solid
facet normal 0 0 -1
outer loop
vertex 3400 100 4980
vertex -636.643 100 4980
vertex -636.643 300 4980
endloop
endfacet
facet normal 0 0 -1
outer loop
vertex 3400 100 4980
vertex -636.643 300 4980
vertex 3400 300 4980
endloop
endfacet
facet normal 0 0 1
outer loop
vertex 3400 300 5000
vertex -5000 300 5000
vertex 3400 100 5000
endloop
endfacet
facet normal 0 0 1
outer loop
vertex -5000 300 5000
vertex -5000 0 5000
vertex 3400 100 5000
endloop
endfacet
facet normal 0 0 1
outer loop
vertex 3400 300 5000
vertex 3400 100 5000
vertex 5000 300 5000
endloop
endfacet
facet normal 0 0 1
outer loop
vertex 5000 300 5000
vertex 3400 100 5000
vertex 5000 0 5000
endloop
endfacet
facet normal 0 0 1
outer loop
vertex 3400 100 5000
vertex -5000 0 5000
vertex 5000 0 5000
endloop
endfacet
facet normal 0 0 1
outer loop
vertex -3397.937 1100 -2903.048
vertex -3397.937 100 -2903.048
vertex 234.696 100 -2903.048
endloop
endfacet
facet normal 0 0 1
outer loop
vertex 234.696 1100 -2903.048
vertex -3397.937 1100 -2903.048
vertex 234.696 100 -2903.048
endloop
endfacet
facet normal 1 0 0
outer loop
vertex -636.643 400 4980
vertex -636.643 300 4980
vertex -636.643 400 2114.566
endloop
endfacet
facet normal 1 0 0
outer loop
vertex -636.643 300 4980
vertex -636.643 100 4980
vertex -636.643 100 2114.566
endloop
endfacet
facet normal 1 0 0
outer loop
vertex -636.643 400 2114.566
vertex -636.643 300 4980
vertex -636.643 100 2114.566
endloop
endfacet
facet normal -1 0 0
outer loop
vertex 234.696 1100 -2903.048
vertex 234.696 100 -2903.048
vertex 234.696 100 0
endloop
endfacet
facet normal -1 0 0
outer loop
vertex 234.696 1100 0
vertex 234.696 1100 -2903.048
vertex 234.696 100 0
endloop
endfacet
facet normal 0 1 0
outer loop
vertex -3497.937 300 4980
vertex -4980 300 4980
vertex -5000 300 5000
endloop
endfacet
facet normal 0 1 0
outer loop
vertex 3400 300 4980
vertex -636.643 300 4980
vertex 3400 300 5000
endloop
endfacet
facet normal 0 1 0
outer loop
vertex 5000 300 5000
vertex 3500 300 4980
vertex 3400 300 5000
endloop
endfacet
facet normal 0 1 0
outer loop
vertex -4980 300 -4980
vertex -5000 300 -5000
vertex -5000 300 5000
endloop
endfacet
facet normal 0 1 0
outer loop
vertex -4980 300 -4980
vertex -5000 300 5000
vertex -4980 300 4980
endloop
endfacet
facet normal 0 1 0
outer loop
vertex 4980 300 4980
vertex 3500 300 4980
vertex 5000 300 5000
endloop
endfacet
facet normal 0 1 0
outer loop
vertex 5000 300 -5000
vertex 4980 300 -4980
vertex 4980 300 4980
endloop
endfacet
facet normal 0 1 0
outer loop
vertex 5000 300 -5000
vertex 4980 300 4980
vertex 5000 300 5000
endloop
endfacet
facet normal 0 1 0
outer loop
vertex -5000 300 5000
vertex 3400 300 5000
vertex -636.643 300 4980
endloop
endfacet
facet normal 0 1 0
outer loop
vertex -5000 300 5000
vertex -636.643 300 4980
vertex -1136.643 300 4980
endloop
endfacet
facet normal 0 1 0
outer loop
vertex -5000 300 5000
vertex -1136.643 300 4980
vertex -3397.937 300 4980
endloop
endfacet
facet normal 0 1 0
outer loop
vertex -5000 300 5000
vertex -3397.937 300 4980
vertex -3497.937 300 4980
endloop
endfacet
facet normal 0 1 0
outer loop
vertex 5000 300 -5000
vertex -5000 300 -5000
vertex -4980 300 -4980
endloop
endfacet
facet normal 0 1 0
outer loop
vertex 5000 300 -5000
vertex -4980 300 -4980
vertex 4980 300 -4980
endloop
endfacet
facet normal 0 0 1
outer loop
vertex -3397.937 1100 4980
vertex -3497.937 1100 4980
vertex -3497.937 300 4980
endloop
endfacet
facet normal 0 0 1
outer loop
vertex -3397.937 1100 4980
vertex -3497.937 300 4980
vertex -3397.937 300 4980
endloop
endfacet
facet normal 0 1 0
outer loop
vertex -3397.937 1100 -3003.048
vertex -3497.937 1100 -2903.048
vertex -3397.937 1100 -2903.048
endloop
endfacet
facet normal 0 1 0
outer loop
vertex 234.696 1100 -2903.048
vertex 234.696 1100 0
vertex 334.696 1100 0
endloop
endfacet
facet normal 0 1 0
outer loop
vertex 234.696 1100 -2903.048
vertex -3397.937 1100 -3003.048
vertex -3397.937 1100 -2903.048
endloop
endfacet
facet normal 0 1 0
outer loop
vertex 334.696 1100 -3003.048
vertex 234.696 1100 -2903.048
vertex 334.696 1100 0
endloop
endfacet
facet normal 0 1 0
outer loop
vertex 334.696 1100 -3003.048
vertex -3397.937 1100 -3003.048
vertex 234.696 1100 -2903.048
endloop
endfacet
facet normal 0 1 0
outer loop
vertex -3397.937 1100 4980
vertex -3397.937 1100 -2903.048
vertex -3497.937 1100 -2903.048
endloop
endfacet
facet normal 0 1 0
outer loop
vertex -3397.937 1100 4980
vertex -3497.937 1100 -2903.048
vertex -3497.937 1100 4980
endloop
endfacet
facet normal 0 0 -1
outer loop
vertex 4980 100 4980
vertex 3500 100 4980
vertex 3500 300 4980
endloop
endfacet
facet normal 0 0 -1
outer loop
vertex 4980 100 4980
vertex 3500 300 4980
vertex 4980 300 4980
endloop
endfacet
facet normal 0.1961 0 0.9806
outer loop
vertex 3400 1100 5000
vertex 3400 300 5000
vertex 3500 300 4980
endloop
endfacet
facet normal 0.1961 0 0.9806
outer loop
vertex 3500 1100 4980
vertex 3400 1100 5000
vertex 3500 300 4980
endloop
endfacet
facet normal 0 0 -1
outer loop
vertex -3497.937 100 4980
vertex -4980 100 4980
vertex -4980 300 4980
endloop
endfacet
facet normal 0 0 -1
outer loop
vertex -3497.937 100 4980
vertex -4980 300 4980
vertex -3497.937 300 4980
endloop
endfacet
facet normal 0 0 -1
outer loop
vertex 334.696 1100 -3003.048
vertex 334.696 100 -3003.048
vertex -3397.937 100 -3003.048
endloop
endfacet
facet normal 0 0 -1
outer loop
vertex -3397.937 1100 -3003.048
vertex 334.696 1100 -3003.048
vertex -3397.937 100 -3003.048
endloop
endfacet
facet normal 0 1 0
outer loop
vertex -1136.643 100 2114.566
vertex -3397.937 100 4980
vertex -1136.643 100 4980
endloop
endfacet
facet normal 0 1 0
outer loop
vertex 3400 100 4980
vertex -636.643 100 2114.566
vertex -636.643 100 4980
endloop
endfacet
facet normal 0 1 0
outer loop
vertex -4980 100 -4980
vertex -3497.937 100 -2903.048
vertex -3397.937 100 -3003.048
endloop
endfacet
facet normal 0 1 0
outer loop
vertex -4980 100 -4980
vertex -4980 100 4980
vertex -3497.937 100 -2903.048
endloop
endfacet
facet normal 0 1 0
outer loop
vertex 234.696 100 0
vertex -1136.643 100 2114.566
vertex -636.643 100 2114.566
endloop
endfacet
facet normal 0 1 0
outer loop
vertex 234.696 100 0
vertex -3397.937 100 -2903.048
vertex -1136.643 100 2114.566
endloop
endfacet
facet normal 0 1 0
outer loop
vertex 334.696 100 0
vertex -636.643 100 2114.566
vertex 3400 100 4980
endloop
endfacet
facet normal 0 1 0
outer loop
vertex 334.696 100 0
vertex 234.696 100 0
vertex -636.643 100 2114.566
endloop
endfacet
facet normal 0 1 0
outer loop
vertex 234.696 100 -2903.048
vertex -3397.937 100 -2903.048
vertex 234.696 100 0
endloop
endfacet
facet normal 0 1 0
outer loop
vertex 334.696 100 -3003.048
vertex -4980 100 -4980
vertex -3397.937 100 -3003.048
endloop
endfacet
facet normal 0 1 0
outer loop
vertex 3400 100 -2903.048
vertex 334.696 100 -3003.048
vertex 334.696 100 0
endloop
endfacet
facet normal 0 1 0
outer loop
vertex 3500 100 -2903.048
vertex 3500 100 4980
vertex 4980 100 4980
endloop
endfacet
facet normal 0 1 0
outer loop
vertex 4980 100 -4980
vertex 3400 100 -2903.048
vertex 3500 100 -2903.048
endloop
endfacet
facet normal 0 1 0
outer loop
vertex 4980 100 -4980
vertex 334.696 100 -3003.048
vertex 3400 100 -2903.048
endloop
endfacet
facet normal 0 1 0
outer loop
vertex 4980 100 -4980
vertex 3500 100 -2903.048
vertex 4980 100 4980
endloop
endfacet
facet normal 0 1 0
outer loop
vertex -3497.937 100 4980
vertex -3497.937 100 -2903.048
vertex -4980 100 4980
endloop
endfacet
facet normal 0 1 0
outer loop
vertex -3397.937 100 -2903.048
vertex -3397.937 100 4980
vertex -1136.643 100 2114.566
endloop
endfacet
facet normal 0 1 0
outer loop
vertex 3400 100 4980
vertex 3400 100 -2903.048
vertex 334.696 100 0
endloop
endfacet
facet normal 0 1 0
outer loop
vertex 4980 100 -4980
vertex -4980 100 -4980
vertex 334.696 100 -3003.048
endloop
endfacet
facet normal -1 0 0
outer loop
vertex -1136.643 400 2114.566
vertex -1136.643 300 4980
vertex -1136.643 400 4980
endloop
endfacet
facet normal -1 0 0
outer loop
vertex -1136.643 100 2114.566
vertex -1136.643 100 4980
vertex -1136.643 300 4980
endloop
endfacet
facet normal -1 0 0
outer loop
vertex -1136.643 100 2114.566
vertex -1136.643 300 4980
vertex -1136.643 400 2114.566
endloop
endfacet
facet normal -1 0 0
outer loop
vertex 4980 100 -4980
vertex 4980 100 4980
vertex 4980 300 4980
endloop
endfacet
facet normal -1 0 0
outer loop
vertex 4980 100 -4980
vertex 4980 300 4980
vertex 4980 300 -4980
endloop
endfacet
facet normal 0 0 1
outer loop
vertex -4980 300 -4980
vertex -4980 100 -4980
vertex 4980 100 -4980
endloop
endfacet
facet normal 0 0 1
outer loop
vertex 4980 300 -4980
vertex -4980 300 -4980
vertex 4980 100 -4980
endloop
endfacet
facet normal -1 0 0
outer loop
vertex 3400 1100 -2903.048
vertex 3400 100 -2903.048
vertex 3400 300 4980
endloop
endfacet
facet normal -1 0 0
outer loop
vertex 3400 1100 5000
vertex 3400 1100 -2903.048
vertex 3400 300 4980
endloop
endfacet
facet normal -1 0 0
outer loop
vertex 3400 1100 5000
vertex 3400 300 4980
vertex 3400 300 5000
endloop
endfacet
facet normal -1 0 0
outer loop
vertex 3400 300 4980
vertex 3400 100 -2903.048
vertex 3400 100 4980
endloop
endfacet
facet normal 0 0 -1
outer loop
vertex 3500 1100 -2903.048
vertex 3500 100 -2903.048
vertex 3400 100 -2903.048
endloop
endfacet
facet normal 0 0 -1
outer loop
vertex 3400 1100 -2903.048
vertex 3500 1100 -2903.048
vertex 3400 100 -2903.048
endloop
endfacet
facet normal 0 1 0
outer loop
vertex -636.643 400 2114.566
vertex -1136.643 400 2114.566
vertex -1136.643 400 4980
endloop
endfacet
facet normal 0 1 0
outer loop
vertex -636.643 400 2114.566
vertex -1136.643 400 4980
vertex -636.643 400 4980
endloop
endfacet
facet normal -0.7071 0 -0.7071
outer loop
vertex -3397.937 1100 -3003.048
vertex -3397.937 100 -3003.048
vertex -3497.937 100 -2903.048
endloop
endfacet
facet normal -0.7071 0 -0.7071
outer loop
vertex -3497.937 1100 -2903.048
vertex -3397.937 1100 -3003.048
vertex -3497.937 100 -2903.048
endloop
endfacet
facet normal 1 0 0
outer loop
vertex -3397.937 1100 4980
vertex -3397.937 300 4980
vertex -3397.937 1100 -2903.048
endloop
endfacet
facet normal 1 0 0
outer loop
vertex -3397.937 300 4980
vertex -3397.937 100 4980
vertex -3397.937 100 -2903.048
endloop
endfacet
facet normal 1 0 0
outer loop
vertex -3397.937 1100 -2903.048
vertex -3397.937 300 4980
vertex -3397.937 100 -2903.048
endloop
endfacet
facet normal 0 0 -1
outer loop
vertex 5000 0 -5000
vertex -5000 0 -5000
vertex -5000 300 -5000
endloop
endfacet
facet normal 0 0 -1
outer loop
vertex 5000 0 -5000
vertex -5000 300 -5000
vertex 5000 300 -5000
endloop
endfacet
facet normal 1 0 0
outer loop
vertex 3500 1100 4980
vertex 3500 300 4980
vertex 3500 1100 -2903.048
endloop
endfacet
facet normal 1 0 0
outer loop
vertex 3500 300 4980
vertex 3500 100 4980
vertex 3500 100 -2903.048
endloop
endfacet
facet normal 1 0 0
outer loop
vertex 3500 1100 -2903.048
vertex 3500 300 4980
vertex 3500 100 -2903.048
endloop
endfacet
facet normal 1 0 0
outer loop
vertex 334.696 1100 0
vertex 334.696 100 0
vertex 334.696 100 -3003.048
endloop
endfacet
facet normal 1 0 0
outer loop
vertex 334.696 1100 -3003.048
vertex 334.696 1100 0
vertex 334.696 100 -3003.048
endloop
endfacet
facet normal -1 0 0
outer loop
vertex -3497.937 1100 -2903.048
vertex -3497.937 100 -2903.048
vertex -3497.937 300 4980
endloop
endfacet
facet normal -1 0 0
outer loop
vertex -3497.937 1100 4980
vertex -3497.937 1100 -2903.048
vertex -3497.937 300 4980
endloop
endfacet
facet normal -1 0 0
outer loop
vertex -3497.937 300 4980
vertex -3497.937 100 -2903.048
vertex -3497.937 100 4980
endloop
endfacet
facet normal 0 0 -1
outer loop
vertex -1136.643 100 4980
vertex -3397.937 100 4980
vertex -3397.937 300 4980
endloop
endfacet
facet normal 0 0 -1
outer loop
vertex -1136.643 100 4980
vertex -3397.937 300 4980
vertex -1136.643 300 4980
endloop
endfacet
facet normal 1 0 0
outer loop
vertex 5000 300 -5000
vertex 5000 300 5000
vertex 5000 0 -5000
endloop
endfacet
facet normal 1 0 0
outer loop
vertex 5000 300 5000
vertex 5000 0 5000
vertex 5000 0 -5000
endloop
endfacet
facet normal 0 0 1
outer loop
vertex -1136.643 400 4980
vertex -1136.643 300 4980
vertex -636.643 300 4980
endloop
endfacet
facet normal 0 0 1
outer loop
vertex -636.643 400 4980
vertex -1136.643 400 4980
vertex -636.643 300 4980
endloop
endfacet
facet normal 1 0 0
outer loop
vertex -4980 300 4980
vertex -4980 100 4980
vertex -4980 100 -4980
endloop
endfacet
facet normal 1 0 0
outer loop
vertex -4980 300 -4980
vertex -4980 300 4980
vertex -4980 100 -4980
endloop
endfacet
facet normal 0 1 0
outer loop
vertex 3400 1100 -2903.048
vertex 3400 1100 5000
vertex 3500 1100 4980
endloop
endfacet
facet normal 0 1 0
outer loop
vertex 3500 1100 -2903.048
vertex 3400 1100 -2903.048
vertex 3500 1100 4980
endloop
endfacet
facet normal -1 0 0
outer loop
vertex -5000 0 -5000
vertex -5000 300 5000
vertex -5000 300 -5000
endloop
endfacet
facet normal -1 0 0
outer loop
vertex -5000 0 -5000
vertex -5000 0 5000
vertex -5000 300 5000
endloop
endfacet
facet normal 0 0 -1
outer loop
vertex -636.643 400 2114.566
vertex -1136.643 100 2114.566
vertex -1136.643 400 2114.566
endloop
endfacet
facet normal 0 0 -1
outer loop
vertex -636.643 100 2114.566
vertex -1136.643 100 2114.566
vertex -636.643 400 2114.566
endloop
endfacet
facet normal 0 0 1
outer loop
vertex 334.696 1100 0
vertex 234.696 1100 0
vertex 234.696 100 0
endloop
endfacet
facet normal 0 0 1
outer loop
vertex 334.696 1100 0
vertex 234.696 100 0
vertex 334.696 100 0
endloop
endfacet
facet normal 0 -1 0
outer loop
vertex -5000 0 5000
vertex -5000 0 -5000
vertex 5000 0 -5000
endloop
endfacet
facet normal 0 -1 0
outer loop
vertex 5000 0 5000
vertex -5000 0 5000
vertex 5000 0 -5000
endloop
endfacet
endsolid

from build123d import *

# Parameters (mm, degrees)
SKETCH1_W           = 10000
SKETCH1_H           = 10000
BOSS_EXTRUDE1_DEPTH = 100
SKETCH2_W           = 10000
SKETCH2_H           = 10000
SKETCH2_W_2         = 9960
SKETCH2_H_2         = 9960
BOSS_EXTRUDE2_DEPTH = 200
BOSS_EXTRUDE3_DEPTH = 1000
SKETCH6_W           = 500
SKETCH6_H           = 2865.434079215
BOSS_EXTRUDE4_DEPTH = 300


with BuildPart() as part:
    # Sketch1 → Boss-Extrude1 (new body)
    with BuildSketch(Plane(origin=(0, 0, 0), x_dir=(1, 0, 0), z_dir=(0, 1, 0))):
        Rectangle(SKETCH1_W, SKETCH1_H)
    extrude(amount=BOSS_EXTRUDE1_DEPTH)

    # Sketch2 → Boss-Extrude2 (add)
    with BuildSketch(Plane(origin=(0, 100, 0), x_dir=(1, 0, 0), z_dir=(0, 1, 0))):
        Rectangle(SKETCH2_W, SKETCH2_H)
        Rectangle(SKETCH2_W_2, SKETCH2_H_2, mode=Mode.SUBTRACT)
    extrude(amount=BOSS_EXTRUDE2_DEPTH)

    # Sketch5 → Boss-Extrude3 (add)
    with BuildSketch(Plane(origin=(0, 100, 0), x_dir=(1, 0, 0), z_dir=(0, 1, 0))):
        Polygon((3500, -4980), (3500, 2903.048128535), (3400, 2903.048128535), (3400, -5000), align=None)
        Polygon((334.695730022, 3003.048128535), (-3397.936530428, 3003.048128535), (-3497.936530428, 2903.048128535), (-3497.936530428, -4980), (-3397.936530428, -4980), (-3397.936530428, 2903.048128535), (234.695730022, 2903.048128535), (234.695730022, 0), (334.695730022, 0), (334.695730022, 2903.048128535), align=None)
    extrude(amount=BOSS_EXTRUDE3_DEPTH)

    # Sketch6 → Boss-Extrude4 (add)
    with BuildSketch(Plane(origin=(0, 100, 0), x_dir=(1, 0, 0), z_dir=(0, 1, 0))):
        with Locations((-886.643182601, -3547.282960393)):
            Rectangle(SKETCH6_W, SKETCH6_H)
    extrude(amount=BOSS_EXTRUDE4_DEPTH)


solid = part.part
